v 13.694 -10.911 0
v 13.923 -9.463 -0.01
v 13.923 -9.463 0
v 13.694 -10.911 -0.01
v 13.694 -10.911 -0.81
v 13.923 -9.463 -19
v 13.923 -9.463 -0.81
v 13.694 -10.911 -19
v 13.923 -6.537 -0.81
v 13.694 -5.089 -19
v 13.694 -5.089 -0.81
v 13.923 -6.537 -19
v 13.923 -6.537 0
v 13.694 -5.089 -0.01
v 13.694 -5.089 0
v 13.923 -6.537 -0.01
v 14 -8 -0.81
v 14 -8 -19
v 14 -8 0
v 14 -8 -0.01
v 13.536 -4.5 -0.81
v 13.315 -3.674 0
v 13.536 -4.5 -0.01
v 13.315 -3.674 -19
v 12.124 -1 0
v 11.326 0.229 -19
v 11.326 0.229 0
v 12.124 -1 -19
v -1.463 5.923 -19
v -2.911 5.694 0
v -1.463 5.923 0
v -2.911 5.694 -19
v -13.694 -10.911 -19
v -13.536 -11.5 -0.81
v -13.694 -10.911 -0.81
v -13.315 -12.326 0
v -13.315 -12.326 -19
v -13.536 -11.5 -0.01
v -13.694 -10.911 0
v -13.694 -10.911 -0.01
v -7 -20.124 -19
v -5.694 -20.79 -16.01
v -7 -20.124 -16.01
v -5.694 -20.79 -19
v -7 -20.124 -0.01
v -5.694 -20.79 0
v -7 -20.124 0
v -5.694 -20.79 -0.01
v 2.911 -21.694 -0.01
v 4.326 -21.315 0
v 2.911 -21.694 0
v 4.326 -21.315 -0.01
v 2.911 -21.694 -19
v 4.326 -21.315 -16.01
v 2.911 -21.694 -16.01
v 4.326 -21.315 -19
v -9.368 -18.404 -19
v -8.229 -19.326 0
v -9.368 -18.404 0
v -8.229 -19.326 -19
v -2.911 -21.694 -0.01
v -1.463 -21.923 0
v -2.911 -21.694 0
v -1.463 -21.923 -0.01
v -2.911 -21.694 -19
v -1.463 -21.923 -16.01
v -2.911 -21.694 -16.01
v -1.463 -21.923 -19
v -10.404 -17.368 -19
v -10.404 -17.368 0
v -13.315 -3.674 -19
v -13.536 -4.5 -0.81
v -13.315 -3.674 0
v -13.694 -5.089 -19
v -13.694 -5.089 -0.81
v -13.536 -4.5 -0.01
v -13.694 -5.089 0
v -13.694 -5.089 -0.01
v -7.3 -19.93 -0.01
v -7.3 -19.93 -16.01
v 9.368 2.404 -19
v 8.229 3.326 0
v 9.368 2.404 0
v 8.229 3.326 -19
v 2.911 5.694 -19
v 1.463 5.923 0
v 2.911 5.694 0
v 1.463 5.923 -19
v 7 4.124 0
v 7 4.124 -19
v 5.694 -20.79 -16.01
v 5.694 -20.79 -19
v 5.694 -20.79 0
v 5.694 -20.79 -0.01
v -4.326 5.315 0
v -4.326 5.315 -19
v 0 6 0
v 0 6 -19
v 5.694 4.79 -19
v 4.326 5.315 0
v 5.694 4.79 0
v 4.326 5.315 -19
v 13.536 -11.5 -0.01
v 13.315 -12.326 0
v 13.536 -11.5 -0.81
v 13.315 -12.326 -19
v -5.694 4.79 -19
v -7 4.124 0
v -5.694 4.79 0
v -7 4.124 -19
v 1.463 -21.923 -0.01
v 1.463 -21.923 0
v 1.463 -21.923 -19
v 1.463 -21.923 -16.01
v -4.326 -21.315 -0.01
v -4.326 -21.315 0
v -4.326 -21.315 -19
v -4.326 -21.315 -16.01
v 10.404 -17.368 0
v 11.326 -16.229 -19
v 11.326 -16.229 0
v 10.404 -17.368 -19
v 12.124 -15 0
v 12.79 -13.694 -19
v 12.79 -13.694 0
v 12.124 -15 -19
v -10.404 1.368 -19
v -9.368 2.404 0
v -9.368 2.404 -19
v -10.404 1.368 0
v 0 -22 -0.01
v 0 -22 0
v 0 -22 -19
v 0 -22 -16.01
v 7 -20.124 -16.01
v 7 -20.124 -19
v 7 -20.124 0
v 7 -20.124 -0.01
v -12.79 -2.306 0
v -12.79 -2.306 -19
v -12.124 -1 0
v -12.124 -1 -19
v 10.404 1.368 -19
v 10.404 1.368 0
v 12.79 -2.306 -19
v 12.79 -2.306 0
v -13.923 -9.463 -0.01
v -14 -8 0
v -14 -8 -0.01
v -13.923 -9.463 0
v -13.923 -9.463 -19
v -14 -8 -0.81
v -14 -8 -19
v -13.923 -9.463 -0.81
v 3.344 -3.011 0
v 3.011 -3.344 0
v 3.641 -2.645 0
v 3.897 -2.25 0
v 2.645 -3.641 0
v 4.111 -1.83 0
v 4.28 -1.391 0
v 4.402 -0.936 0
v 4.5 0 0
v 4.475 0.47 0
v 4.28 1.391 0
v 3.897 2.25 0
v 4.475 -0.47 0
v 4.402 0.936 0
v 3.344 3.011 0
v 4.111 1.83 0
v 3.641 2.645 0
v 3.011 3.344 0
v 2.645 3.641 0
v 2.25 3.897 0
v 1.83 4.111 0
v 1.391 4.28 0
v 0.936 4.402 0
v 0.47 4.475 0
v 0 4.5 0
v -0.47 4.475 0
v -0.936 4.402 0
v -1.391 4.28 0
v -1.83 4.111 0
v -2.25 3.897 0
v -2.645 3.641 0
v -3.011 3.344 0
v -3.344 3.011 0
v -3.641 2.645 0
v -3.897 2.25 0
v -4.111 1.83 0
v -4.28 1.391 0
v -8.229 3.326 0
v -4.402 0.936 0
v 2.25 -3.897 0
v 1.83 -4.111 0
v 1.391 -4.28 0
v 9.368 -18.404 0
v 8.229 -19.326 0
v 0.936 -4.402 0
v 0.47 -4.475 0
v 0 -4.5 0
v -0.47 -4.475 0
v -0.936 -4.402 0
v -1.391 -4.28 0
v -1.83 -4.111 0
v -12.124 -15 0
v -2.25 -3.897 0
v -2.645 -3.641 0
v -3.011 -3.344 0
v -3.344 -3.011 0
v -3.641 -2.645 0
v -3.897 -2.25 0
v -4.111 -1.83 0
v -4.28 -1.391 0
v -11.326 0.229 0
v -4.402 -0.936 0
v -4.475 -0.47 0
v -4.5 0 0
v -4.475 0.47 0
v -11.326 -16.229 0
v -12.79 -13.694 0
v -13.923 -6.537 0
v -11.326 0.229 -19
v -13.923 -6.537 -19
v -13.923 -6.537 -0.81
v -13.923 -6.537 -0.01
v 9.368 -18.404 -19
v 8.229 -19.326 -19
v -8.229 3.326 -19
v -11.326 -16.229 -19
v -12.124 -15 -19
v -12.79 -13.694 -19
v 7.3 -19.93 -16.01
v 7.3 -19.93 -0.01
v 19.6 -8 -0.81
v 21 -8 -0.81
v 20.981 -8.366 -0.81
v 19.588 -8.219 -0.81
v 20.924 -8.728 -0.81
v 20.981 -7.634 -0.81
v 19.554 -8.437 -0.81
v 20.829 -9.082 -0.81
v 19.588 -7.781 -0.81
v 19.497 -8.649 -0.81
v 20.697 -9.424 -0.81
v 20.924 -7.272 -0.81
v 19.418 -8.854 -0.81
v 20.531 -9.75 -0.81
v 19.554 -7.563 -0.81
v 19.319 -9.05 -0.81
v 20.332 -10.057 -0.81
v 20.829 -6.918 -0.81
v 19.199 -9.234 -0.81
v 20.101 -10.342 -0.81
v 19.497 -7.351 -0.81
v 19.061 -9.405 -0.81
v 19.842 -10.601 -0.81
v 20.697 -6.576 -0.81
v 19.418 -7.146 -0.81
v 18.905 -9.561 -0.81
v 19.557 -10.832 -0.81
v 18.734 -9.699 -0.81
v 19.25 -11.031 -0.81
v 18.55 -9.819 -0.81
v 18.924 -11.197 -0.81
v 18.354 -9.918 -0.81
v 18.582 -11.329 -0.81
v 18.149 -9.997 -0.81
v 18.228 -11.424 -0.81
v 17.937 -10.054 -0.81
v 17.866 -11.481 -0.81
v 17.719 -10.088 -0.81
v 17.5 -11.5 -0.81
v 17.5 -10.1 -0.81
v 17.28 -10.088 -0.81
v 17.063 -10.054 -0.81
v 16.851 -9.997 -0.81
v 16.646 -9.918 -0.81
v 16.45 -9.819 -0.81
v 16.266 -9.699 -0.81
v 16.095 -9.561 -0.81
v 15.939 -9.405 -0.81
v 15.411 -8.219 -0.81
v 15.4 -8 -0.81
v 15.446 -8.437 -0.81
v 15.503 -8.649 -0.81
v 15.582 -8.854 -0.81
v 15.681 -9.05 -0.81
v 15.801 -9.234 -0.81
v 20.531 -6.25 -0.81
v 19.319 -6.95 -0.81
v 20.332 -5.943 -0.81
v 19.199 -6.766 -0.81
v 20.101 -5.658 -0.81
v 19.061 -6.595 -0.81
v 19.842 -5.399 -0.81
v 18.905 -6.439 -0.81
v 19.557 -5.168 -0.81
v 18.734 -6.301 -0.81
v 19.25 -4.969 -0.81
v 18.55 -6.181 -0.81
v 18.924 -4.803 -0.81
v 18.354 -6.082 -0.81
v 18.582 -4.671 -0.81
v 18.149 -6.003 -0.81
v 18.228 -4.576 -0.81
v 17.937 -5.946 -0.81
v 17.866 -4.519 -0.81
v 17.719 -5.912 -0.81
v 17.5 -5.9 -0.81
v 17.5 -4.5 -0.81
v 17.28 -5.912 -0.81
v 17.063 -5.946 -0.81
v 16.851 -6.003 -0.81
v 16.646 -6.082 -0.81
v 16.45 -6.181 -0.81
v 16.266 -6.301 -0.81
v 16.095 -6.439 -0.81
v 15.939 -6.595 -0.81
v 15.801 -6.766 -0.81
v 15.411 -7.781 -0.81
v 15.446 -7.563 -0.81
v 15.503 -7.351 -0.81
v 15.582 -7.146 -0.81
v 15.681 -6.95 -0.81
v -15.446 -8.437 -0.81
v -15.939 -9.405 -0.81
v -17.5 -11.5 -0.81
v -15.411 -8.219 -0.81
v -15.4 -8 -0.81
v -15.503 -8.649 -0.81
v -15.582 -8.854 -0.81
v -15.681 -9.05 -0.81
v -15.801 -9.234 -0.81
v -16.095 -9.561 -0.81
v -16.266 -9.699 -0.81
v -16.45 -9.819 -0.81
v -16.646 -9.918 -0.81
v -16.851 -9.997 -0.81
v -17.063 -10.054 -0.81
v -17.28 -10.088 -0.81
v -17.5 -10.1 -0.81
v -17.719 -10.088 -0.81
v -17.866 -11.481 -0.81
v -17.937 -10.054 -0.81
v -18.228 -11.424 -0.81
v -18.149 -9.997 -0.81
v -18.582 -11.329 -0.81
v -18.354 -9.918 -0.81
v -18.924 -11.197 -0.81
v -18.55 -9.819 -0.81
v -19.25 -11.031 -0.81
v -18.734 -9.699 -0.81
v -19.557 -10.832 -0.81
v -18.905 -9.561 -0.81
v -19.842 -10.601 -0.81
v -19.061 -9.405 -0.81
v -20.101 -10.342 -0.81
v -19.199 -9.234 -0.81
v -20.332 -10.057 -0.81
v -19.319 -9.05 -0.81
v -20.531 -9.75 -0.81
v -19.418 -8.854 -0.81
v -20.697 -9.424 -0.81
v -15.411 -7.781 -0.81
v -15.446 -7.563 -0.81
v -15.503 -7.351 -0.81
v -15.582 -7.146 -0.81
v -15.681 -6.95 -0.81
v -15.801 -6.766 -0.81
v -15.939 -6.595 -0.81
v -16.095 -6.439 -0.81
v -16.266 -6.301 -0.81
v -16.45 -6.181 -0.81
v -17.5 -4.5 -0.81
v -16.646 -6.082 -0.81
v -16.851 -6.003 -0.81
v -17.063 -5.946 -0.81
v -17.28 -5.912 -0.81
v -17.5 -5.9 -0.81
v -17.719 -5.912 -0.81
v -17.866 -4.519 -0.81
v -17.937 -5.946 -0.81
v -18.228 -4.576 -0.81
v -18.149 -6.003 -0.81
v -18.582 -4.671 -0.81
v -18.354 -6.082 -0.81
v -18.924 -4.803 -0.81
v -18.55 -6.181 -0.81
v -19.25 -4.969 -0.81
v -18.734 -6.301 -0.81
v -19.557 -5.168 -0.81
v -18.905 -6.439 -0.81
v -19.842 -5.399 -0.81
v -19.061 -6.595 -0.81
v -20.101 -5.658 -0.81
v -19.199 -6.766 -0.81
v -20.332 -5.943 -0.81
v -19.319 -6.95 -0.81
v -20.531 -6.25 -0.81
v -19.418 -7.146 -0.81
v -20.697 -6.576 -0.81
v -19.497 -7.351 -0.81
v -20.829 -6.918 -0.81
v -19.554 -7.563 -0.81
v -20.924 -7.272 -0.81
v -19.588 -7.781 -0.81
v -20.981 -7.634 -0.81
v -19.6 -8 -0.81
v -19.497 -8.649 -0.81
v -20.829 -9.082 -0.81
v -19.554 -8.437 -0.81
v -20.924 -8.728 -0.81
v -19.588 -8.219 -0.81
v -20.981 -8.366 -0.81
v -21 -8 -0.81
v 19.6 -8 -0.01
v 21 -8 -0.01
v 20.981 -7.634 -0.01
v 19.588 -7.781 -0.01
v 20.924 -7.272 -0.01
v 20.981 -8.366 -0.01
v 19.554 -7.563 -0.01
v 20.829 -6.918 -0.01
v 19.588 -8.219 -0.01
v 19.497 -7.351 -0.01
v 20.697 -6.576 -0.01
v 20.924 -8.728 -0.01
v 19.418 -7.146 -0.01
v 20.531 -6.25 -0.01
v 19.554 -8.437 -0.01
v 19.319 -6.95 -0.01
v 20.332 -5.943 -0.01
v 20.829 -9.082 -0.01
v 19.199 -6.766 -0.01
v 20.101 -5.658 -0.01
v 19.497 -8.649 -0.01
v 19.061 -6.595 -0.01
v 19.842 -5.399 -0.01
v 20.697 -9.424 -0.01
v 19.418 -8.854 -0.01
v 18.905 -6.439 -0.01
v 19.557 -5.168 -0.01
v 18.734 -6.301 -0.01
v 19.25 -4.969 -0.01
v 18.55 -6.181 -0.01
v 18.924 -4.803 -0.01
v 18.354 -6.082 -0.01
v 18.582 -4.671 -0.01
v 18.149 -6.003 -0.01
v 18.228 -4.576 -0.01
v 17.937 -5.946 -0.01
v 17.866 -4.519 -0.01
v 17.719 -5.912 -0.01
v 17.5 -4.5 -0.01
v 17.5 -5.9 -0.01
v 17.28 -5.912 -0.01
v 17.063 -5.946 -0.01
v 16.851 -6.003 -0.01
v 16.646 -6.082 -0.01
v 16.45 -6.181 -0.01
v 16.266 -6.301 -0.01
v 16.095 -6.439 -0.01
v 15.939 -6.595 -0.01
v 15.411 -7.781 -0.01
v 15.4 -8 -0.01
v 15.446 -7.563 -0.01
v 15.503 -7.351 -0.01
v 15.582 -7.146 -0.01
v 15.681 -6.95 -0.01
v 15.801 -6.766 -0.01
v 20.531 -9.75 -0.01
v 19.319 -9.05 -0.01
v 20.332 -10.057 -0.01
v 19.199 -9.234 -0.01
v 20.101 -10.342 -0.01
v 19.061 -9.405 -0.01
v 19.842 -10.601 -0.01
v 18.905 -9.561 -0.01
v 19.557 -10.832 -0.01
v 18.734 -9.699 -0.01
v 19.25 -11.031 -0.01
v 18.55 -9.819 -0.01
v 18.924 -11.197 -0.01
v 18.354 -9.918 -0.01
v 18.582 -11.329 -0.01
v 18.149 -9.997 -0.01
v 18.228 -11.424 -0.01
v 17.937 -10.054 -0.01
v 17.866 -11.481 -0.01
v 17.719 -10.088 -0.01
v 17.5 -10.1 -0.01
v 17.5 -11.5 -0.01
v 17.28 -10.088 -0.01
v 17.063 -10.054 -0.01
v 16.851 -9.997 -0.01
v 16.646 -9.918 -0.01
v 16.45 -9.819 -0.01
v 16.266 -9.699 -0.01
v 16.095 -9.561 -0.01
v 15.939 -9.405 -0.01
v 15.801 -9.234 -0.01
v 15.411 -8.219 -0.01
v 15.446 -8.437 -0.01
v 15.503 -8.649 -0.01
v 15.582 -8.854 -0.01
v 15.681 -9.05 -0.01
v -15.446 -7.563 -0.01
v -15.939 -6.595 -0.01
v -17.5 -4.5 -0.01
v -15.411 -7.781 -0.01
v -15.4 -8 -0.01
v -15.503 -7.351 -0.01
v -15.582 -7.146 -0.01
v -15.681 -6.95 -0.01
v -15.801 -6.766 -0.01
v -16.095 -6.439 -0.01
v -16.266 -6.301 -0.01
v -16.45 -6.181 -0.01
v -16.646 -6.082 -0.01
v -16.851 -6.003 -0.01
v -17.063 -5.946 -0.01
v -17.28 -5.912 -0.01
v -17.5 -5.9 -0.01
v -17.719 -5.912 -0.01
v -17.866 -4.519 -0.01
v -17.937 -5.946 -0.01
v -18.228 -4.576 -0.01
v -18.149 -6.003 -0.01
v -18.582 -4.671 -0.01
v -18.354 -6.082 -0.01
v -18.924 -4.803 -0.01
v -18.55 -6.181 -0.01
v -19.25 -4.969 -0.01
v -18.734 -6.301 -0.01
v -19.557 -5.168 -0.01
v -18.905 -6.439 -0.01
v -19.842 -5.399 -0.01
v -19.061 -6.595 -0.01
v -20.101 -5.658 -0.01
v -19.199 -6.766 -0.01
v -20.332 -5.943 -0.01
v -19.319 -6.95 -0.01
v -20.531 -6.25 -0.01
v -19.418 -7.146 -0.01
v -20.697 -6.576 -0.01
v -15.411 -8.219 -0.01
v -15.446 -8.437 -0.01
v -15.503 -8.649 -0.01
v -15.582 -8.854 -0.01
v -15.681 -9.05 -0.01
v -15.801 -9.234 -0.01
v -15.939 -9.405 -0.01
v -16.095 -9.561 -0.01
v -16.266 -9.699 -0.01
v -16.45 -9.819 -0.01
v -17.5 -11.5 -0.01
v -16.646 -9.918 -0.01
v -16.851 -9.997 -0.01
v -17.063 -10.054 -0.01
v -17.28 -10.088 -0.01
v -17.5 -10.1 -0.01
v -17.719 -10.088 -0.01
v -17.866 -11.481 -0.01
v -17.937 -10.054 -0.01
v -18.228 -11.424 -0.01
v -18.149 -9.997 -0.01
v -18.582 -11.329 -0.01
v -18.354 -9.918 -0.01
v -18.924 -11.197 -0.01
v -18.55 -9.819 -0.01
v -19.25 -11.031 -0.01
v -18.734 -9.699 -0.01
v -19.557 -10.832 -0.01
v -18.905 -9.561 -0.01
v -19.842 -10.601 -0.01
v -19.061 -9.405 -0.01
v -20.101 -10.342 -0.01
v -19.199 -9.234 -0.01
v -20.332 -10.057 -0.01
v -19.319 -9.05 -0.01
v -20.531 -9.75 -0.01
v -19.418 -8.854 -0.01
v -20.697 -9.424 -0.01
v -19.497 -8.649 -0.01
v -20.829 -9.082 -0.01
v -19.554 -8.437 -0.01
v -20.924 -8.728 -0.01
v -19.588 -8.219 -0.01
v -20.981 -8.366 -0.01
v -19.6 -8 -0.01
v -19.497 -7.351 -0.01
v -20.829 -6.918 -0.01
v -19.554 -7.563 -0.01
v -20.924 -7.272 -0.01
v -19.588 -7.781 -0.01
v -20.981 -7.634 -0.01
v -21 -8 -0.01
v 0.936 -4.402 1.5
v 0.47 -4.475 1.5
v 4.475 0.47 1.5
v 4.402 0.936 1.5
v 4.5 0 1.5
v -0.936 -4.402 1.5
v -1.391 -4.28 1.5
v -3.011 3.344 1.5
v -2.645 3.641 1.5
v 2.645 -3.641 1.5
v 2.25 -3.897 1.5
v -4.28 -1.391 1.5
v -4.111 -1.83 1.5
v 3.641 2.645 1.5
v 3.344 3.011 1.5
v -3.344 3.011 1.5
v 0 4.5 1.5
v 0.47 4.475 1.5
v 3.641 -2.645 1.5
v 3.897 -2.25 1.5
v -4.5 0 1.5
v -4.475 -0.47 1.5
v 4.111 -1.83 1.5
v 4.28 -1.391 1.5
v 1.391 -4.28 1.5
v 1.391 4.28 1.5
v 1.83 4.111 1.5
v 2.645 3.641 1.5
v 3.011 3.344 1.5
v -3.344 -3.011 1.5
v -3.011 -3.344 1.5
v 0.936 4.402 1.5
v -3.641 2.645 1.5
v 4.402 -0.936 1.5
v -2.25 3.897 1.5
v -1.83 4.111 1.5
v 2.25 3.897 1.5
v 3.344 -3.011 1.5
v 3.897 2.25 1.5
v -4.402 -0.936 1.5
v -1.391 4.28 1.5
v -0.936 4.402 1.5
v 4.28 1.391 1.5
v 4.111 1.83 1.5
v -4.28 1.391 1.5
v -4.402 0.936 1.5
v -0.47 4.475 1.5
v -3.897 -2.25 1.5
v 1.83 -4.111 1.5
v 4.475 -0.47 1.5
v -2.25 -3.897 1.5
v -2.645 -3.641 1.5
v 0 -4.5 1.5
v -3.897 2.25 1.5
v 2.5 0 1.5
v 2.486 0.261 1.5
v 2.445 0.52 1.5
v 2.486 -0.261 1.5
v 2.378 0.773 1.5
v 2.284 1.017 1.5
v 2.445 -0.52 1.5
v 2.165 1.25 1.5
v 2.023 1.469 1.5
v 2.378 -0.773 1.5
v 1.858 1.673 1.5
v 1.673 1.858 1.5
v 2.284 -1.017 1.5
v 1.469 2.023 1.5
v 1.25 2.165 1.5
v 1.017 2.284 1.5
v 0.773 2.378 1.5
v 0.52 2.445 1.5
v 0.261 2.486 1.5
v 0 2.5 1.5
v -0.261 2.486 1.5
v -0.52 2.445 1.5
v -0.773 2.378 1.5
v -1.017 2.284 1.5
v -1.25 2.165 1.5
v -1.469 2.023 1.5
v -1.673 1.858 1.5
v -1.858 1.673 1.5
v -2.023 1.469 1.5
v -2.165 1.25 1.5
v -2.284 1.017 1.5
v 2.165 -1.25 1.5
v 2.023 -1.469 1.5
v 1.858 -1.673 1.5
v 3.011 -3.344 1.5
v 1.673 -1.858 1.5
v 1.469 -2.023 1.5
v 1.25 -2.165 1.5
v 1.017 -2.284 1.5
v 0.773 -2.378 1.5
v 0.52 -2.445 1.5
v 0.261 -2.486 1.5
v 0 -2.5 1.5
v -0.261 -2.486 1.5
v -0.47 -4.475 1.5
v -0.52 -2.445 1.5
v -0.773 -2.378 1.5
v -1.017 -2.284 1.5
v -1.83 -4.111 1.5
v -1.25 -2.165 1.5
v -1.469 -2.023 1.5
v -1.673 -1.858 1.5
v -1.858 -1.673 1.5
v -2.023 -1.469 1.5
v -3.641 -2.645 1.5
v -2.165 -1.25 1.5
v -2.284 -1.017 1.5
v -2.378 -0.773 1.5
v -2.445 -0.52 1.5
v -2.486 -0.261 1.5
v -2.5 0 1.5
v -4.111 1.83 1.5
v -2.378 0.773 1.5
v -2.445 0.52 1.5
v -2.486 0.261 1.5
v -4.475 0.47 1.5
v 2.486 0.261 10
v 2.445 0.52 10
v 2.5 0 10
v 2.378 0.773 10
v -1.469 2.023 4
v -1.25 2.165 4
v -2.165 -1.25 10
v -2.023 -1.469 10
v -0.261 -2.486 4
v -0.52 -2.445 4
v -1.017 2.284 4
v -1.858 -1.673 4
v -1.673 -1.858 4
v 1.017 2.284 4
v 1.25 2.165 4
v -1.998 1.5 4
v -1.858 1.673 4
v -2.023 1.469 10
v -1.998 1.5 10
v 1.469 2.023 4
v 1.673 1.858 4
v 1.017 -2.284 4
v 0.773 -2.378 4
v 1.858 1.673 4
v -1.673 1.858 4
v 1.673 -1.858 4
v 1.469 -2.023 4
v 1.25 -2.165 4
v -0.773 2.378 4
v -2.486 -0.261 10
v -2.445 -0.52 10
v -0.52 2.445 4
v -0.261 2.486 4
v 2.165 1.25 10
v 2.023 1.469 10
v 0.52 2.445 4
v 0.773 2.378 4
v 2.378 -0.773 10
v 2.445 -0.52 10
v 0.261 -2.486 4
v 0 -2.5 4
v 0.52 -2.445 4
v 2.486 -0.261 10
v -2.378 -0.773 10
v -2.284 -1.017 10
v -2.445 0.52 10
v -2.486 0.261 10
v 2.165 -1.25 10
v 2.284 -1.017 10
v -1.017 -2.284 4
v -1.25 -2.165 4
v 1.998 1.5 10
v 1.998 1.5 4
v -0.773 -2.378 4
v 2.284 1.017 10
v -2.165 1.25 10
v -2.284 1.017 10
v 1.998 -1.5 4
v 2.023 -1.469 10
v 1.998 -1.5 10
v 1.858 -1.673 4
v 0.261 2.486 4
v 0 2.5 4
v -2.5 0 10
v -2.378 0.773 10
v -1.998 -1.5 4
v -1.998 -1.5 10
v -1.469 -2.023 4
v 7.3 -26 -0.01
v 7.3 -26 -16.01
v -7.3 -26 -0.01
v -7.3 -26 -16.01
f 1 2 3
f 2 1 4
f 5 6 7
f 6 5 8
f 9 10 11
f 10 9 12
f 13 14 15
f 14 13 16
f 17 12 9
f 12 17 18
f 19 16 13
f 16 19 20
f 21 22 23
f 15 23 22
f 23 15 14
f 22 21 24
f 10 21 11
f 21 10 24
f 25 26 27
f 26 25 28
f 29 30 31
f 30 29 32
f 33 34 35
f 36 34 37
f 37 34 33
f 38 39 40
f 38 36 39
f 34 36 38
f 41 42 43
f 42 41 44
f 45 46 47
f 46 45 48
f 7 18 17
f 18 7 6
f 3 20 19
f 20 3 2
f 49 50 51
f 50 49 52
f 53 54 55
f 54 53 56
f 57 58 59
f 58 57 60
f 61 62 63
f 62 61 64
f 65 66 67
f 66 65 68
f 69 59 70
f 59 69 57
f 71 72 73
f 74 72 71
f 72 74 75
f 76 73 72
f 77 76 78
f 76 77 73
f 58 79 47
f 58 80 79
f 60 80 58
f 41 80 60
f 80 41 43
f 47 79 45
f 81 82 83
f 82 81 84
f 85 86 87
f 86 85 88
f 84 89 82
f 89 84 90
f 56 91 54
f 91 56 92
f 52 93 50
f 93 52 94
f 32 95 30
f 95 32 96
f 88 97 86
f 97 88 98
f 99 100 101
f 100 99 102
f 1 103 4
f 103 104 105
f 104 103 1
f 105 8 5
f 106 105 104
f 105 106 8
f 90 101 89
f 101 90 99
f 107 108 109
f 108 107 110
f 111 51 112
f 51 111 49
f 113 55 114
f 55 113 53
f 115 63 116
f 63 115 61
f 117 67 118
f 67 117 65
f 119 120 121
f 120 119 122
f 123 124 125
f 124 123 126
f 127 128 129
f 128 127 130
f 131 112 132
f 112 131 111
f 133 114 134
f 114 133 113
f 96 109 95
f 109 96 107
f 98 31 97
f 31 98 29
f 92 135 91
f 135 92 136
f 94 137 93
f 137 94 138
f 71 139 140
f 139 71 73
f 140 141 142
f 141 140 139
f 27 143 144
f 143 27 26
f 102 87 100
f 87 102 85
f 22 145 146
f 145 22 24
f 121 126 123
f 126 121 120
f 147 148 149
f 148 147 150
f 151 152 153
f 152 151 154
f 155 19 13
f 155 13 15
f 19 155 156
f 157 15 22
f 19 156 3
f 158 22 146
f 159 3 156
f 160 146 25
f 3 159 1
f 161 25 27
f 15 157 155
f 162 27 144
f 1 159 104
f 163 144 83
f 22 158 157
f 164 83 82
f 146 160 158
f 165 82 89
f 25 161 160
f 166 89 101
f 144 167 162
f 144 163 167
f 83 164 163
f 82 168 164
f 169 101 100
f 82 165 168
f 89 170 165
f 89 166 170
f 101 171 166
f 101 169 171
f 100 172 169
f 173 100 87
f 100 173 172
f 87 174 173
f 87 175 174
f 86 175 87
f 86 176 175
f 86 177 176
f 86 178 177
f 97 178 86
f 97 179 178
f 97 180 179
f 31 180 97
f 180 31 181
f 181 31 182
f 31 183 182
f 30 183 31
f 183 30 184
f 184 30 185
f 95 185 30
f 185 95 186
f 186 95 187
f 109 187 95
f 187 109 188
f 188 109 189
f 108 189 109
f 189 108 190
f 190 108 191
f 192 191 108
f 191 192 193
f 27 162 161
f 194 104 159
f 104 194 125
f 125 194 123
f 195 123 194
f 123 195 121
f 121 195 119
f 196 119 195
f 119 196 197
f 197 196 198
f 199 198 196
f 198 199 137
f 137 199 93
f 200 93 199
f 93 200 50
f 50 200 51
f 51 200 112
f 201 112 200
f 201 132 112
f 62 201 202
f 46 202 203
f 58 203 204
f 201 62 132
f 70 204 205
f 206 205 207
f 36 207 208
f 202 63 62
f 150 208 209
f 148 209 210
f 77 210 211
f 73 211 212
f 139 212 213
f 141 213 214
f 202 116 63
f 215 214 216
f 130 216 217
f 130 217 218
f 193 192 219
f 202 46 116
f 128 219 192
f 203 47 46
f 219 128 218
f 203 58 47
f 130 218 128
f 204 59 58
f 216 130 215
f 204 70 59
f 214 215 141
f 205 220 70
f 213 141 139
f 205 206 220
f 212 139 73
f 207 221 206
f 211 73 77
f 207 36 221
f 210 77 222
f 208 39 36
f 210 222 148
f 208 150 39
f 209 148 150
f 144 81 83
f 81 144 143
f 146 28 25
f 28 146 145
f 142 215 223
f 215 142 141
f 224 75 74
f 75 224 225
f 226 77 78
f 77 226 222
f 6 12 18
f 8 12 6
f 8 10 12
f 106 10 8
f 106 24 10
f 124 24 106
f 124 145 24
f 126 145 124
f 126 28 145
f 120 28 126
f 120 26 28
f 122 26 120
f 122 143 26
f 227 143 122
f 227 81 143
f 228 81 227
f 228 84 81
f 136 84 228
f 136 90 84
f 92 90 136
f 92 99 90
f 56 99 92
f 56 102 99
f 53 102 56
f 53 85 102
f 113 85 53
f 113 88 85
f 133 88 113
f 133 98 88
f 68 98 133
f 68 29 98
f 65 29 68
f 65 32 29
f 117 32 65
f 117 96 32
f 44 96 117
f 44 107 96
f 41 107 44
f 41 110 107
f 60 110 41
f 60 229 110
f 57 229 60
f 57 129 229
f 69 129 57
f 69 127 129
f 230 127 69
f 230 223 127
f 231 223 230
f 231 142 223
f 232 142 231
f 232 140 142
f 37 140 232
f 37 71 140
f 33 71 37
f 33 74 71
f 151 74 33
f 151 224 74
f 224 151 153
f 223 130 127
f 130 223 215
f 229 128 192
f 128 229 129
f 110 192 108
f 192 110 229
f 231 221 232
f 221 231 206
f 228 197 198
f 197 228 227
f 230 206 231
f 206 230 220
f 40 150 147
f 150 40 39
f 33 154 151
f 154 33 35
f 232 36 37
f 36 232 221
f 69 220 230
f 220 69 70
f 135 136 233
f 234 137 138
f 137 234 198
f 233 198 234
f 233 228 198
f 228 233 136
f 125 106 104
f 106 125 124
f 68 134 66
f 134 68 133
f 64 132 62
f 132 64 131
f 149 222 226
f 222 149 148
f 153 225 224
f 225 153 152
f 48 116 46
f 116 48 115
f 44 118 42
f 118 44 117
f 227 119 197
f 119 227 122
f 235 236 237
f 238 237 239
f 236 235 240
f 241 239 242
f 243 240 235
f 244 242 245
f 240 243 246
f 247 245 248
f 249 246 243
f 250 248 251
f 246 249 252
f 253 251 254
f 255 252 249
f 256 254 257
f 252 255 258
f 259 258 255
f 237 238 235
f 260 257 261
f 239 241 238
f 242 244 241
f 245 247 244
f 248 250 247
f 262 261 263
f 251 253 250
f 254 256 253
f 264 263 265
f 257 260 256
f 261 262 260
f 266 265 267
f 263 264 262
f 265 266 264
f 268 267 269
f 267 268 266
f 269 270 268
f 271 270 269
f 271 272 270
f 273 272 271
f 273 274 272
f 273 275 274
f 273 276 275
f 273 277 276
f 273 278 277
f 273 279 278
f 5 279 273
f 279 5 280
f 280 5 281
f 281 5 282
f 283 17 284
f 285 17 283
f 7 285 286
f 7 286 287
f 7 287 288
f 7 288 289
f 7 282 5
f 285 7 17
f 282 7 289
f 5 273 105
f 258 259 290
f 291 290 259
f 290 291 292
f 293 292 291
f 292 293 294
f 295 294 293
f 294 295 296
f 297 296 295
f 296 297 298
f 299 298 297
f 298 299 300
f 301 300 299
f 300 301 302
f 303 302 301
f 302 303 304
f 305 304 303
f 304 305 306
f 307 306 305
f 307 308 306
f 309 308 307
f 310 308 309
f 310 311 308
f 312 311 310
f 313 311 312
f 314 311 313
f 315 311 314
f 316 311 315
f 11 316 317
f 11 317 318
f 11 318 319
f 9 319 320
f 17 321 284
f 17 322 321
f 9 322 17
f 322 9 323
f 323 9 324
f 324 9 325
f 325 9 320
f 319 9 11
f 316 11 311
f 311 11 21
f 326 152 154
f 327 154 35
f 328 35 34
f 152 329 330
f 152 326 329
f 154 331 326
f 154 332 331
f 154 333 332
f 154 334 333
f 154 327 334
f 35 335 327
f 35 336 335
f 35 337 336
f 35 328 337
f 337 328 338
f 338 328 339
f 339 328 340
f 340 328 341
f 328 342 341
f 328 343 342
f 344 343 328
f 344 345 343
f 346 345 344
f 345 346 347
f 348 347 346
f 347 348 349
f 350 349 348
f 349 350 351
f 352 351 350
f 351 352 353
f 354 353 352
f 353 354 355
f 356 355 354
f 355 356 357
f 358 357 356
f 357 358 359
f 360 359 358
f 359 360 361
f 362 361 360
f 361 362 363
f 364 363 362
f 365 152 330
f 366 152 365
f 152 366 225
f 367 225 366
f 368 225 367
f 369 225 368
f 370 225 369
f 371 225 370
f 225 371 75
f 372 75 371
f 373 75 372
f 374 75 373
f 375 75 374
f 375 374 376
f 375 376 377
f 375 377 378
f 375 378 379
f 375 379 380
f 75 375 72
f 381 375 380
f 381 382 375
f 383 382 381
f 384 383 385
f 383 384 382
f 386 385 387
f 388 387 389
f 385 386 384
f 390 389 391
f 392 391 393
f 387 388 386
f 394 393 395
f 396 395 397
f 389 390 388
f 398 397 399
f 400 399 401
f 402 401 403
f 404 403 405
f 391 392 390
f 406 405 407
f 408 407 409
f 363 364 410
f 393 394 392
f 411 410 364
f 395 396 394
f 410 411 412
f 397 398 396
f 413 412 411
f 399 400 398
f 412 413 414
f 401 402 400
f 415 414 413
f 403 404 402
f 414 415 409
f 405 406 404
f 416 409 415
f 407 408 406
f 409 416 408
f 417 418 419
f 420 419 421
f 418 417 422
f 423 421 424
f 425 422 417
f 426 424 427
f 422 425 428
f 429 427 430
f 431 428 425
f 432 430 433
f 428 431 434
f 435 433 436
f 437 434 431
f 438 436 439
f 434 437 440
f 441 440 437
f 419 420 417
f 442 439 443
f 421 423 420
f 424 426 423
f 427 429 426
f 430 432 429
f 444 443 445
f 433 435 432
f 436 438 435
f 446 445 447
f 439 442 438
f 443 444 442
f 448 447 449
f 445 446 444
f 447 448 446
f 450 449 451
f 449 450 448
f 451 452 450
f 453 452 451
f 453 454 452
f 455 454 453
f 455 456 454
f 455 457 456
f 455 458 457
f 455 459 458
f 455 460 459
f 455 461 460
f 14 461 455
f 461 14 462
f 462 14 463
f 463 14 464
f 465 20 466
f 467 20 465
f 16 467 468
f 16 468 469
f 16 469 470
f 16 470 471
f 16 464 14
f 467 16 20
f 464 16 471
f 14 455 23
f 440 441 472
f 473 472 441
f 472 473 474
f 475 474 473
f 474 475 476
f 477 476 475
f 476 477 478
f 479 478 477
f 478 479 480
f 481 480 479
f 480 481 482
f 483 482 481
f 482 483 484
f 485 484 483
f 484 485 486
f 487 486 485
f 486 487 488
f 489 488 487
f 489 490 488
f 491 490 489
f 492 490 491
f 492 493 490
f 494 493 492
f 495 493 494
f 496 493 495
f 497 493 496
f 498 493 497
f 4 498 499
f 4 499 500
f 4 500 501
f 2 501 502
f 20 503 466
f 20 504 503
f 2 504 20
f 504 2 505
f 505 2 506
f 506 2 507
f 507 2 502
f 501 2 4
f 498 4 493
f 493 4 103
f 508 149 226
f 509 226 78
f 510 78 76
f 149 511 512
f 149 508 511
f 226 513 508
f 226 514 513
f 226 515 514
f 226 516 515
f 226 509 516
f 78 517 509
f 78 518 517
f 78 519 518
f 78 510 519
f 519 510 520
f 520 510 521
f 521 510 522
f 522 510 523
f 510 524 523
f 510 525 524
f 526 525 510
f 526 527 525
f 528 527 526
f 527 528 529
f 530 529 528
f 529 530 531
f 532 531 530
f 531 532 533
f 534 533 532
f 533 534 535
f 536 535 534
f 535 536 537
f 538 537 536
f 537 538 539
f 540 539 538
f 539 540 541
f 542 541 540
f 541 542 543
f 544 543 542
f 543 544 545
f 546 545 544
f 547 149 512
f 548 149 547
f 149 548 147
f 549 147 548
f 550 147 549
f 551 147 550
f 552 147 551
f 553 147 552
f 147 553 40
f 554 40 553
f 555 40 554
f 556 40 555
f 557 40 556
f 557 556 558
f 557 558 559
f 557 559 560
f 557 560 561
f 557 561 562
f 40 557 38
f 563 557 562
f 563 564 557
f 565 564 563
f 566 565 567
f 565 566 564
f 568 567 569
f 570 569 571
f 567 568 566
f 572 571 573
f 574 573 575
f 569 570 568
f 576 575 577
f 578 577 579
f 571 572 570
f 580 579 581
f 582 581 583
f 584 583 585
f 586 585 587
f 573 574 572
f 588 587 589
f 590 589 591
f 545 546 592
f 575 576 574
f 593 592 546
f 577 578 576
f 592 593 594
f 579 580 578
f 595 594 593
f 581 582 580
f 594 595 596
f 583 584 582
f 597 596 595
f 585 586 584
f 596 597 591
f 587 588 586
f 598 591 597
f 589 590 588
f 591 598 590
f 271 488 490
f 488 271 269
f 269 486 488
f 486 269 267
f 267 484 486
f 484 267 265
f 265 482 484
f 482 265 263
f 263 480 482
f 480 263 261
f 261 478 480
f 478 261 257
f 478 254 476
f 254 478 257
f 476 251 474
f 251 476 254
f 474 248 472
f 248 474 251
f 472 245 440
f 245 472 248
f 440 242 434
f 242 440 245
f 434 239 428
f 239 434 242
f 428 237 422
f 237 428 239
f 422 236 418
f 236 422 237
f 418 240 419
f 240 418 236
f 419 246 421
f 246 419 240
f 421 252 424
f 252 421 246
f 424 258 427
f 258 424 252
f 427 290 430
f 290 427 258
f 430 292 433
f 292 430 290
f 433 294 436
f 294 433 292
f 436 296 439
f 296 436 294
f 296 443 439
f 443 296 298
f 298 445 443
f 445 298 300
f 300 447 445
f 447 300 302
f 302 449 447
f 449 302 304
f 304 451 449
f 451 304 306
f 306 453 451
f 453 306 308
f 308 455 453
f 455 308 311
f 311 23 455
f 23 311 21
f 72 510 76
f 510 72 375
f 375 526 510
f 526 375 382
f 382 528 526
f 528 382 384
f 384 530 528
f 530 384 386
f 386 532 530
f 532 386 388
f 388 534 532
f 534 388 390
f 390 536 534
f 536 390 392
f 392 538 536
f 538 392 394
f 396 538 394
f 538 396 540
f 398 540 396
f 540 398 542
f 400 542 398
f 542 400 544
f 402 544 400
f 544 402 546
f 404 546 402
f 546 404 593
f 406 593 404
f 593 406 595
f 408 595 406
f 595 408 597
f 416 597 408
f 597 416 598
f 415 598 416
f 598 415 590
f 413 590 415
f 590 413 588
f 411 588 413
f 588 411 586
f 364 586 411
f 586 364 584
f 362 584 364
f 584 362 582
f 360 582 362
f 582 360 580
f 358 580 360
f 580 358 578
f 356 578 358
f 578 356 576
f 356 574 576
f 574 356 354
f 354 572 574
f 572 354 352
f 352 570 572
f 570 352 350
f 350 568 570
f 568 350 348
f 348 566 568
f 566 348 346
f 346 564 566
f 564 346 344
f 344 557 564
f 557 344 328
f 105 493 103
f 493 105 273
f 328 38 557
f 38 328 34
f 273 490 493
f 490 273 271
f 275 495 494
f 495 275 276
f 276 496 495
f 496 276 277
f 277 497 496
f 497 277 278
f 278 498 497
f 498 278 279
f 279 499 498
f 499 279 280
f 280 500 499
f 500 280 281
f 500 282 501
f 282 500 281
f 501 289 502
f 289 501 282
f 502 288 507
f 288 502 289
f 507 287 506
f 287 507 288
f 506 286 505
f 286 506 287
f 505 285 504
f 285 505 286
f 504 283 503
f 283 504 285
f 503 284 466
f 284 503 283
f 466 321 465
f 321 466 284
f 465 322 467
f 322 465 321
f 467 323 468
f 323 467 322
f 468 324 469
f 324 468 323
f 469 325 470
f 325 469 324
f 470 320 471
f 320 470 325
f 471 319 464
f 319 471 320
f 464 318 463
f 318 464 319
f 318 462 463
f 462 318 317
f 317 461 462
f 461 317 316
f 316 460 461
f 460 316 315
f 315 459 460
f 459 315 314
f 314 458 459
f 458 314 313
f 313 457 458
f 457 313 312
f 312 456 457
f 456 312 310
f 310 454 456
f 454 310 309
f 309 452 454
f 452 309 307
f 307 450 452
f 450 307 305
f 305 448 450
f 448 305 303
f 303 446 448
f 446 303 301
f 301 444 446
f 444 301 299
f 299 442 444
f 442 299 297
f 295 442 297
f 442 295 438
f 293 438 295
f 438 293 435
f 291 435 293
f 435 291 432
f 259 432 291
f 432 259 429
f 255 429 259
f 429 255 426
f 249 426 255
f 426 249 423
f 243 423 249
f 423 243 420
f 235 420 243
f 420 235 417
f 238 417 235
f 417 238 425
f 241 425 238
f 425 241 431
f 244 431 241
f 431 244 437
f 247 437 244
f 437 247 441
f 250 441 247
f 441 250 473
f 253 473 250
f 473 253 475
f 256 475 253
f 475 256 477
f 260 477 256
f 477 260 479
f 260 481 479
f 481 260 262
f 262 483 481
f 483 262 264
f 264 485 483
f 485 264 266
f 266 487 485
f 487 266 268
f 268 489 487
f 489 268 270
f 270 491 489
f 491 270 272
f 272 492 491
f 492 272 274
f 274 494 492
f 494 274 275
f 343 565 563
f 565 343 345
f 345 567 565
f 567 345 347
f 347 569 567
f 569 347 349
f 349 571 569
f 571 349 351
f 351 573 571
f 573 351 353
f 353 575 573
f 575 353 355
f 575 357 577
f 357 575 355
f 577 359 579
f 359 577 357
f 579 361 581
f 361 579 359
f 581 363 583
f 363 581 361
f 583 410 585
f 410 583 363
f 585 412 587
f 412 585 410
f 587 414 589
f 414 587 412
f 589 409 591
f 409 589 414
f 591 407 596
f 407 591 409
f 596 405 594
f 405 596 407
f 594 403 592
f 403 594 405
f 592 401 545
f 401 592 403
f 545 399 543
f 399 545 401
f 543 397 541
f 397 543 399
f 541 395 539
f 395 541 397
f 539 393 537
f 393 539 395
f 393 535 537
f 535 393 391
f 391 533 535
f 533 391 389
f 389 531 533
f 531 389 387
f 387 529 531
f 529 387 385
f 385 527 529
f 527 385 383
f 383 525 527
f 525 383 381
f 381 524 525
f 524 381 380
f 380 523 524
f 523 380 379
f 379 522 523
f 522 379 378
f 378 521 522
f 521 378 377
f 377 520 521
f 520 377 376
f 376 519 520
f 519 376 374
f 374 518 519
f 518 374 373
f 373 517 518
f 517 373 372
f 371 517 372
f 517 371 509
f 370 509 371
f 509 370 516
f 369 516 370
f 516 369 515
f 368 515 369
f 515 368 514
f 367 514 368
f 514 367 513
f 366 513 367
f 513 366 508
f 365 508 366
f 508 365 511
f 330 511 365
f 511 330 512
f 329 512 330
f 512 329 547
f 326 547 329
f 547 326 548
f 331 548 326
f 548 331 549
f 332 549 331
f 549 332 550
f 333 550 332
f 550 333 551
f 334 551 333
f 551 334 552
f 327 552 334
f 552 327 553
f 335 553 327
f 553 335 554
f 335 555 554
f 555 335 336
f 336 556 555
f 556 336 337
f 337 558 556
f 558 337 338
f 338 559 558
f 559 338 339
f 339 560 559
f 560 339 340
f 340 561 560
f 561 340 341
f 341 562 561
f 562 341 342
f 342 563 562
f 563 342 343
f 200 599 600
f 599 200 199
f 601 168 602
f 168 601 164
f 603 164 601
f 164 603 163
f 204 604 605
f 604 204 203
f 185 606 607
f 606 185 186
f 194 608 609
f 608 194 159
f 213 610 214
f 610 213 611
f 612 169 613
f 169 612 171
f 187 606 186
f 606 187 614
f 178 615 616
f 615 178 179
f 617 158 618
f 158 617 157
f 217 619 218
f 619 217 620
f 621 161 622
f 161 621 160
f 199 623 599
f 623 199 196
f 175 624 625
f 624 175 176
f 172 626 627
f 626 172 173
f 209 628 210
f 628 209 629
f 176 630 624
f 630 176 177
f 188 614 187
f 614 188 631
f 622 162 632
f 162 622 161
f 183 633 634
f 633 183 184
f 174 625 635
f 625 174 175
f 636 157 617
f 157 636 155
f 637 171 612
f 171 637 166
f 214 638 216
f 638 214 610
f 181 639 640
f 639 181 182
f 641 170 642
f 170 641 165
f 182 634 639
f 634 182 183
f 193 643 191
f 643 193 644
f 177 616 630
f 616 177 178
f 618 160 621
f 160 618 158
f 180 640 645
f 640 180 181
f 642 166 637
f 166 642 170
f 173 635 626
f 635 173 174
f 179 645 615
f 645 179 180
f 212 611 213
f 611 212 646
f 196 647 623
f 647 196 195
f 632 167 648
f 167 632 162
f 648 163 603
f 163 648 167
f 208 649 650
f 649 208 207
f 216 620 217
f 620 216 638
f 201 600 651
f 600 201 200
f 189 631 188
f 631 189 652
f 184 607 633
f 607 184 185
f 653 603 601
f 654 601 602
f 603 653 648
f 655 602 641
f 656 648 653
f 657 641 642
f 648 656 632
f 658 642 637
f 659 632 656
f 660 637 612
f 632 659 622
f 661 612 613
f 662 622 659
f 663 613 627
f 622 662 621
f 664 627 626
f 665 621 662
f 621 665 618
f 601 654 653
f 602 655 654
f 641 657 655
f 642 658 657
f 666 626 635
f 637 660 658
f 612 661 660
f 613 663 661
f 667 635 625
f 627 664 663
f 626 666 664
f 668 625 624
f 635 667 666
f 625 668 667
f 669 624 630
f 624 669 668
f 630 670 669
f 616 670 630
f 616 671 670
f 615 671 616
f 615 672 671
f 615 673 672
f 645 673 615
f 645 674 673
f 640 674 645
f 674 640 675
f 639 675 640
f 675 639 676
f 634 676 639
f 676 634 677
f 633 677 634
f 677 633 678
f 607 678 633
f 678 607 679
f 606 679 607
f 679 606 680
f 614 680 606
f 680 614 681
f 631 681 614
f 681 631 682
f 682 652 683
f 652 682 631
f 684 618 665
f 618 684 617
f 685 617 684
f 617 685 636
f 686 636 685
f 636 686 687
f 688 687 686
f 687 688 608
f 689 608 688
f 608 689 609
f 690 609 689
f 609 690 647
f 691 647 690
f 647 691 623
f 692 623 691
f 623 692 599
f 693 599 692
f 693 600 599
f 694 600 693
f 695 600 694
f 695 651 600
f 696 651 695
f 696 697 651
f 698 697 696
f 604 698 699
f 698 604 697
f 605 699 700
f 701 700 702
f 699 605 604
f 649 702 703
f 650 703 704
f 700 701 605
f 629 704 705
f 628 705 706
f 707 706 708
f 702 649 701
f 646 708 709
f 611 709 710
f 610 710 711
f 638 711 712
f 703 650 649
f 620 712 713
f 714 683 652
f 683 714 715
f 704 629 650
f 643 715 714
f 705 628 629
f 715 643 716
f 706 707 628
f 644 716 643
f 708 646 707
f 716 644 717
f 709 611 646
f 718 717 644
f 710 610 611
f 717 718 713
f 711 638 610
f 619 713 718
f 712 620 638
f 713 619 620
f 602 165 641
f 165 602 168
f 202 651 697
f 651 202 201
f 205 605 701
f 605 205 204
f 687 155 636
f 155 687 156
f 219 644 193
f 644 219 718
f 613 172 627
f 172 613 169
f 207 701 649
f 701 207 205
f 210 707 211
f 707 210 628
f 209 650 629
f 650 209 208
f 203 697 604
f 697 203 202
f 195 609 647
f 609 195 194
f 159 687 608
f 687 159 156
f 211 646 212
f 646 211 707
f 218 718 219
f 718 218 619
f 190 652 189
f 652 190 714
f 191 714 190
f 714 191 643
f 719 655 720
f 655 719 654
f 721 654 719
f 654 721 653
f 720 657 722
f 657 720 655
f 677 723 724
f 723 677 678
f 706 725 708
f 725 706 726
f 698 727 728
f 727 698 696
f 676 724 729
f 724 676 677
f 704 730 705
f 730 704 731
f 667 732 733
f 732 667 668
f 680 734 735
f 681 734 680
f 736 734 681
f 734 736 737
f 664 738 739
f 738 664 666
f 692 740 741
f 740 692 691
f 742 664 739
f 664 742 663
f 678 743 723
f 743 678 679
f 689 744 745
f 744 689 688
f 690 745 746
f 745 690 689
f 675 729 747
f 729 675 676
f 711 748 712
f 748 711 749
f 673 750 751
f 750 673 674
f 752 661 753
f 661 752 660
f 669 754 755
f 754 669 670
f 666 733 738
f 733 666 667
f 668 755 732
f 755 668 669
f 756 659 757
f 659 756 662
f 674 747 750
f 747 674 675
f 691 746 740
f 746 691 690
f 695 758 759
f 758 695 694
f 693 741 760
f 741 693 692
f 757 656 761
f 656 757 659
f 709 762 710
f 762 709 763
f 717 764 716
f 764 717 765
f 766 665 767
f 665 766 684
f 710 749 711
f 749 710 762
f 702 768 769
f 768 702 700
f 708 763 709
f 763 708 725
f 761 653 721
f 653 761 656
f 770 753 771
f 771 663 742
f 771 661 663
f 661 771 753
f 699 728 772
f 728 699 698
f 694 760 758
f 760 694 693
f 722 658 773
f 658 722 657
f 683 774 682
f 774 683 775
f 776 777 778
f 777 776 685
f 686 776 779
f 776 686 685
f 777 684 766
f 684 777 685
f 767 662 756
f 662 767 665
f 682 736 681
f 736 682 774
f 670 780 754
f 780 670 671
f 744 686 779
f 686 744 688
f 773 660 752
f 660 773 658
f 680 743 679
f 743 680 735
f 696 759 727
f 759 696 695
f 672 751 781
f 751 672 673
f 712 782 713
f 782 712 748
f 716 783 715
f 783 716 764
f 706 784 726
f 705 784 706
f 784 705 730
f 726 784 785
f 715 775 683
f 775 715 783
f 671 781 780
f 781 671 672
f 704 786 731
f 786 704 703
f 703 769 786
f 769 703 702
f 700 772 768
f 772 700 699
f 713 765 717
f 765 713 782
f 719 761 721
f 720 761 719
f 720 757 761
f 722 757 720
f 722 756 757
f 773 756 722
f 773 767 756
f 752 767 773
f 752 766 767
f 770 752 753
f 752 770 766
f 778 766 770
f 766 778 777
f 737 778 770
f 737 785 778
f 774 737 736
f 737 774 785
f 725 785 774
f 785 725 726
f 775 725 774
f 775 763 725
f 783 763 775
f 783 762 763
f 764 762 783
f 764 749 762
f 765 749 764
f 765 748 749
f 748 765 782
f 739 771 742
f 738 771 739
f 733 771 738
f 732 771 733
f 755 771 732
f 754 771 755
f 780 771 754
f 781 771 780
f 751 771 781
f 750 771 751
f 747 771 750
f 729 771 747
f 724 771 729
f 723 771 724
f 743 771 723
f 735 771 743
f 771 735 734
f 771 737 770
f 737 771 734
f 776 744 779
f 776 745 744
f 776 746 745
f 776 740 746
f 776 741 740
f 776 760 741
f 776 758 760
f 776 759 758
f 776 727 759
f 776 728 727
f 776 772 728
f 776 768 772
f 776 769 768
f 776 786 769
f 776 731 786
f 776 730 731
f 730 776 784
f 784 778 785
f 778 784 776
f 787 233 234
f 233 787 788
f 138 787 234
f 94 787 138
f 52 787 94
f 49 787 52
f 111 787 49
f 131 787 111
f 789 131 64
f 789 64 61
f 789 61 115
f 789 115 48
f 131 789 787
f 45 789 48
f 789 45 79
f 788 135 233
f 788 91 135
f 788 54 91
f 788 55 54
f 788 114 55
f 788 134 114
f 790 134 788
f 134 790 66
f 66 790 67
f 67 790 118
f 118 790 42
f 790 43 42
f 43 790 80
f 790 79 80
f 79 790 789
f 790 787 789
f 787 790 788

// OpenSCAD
/*
   Copyright 2015-2018 Scott Bezek and the splitflap contributors

   Licensed under the Apache License, Version 2.0 (the "License");
   you may not use this file except in compliance with the License.
   You may obtain a copy of the License at

       http://www.apache.org/licenses/LICENSE-2.0

   Unless required by applicable law or agreed to in writing, software
   distributed under the License is distributed on an "AS IS" BASIS,
   WITHOUT WARRANTIES OR CONDITIONS OF ANY KIND, either express or implied.
   See the License for the specific language governing permissions and
   limitations under the License.
*/

28byj48_chassis_radius = 28/2;
28byj48_chassis_height = 19;
28byj48_shaft_offset = 8;
28byj48_mount_outer_radius = 3.5;
28byj48_mount_hole_radius = 4.2/2;
28byj48_mount_center_offset = 35/2;
28byj48_mount_bracket_height = 0.8;

28byj48_shaft_collar_radius = 9/2;
28byj48_shaft_collar_height = 1.5;

28byj48_shaft_radius = 5/2;
28byj48_shaft_height = 10;
28byj48_shaft_slotted_width = 3;
28byj48_shaft_slotted_height = 6;

28byj48_backpack_width = 14.6;
28byj48_backpack_extent = 18; // seen values from 17-18
28byj48_backpack_height = 16;

// Exports for use in other files:
function 28byj48_mount_bracket_height() = 28byj48_mount_bracket_height;
function 28byj48_shaft_radius() = 28byj48_shaft_radius;
function 28byj48_mount_center_offset() = 28byj48_mount_center_offset;
function 28byj48_chassis_radius() = 28byj48_chassis_radius;
function 28byj48_shaft_offset() = 28byj48_shaft_offset;
function 28byj48_chassis_height() = 28byj48_chassis_height;
function 28byj48_backpack_extent() = 28byj48_backpack_extent;

// Basic 28BYJ-48 model based on various dimensioned drawings.
// Origin is centered on the shaft, on the front face of the motor, with the shaft in the +z direction
module Stepper28BYJ48() {
    $fn = 60;

    eps = 0.01;

    gray = [0.7, 0.7, 0.7];
    gold = [1, 0.843, 0];
    blue = [0, 0, 1];

    module mounting_holes() {
        linear_extrude(height=28byj48_mount_bracket_height) {
        difference() {
            hull() {
                translate([28byj48_mount_center_offset, 0]) {
                    circle(r=28byj48_mount_outer_radius);
                }
                translate([-28byj48_mount_center_offset, 0]) {
                    circle(r=28byj48_mount_outer_radius);
                }
            }

            translate([28byj48_mount_center_offset, 0]) {
                circle(r=28byj48_mount_hole_radius);
            }
            translate([-28byj48_mount_center_offset, 0]) {
                circle(r=28byj48_mount_hole_radius);
            }
        }
        }
    }

    module shaft_collar() {
        cylinder(r=28byj48_shaft_collar_radius, h=28byj48_shaft_collar_height + eps);
    }

    module shaft() {
        color(gold) {
            difference() {
                cylinder(r=28byj48_shaft_radius, h=28byj48_shaft_height);
                translate([-(28byj48_shaft_radius + eps), 28byj48_shaft_slotted_width / 2, 28byj48_shaft_height - 28byj48_shaft_slotted_height]) {
                    cube([(28byj48_shaft_radius+eps)*2, 28byj48_shaft_radius, 28byj48_shaft_slotted_height+eps]);
                }
                translate([-(28byj48_shaft_radius + eps), - 28byj48_shaft_radius - (28byj48_shaft_slotted_width / 2), 28byj48_shaft_height - 28byj48_shaft_slotted_height]) {
                    cube([(28byj48_shaft_radius+eps)*2, 28byj48_shaft_radius, 28byj48_shaft_slotted_height+eps]);
                }
            }
        }
    }

    module chassis() {
        color(gray) {
            translate([0, 0, -28byj48_chassis_height]) {
                cylinder(r=28byj48_chassis_radius, h=28byj48_chassis_height);
            }
            translate([0, 0, -28byj48_mount_bracket_height - eps]) {
                mounting_holes();
            }
            translate([0, 28byj48_shaft_offset, -eps]) {
                shaft_collar();
            }
        }
    }

    module backpack() {
        color(blue) {
            translate([-28byj48_backpack_width/2, 0, -28byj48_backpack_height - eps]) {
                cube([28byj48_backpack_width, 28byj48_backpack_extent, 28byj48_backpack_height]);
            }
        }
    }

    translate([0, -28byj48_shaft_offset, 0]) {
        chassis();
        translate([0, 28byj48_shaft_offset, 0]) {
            shaft();
        }
        translate([0, -28byj48_backpack_extent, 0]) {
            backpack();
        }
    }
}

// Example usage:
Stepper28BYJ48();
